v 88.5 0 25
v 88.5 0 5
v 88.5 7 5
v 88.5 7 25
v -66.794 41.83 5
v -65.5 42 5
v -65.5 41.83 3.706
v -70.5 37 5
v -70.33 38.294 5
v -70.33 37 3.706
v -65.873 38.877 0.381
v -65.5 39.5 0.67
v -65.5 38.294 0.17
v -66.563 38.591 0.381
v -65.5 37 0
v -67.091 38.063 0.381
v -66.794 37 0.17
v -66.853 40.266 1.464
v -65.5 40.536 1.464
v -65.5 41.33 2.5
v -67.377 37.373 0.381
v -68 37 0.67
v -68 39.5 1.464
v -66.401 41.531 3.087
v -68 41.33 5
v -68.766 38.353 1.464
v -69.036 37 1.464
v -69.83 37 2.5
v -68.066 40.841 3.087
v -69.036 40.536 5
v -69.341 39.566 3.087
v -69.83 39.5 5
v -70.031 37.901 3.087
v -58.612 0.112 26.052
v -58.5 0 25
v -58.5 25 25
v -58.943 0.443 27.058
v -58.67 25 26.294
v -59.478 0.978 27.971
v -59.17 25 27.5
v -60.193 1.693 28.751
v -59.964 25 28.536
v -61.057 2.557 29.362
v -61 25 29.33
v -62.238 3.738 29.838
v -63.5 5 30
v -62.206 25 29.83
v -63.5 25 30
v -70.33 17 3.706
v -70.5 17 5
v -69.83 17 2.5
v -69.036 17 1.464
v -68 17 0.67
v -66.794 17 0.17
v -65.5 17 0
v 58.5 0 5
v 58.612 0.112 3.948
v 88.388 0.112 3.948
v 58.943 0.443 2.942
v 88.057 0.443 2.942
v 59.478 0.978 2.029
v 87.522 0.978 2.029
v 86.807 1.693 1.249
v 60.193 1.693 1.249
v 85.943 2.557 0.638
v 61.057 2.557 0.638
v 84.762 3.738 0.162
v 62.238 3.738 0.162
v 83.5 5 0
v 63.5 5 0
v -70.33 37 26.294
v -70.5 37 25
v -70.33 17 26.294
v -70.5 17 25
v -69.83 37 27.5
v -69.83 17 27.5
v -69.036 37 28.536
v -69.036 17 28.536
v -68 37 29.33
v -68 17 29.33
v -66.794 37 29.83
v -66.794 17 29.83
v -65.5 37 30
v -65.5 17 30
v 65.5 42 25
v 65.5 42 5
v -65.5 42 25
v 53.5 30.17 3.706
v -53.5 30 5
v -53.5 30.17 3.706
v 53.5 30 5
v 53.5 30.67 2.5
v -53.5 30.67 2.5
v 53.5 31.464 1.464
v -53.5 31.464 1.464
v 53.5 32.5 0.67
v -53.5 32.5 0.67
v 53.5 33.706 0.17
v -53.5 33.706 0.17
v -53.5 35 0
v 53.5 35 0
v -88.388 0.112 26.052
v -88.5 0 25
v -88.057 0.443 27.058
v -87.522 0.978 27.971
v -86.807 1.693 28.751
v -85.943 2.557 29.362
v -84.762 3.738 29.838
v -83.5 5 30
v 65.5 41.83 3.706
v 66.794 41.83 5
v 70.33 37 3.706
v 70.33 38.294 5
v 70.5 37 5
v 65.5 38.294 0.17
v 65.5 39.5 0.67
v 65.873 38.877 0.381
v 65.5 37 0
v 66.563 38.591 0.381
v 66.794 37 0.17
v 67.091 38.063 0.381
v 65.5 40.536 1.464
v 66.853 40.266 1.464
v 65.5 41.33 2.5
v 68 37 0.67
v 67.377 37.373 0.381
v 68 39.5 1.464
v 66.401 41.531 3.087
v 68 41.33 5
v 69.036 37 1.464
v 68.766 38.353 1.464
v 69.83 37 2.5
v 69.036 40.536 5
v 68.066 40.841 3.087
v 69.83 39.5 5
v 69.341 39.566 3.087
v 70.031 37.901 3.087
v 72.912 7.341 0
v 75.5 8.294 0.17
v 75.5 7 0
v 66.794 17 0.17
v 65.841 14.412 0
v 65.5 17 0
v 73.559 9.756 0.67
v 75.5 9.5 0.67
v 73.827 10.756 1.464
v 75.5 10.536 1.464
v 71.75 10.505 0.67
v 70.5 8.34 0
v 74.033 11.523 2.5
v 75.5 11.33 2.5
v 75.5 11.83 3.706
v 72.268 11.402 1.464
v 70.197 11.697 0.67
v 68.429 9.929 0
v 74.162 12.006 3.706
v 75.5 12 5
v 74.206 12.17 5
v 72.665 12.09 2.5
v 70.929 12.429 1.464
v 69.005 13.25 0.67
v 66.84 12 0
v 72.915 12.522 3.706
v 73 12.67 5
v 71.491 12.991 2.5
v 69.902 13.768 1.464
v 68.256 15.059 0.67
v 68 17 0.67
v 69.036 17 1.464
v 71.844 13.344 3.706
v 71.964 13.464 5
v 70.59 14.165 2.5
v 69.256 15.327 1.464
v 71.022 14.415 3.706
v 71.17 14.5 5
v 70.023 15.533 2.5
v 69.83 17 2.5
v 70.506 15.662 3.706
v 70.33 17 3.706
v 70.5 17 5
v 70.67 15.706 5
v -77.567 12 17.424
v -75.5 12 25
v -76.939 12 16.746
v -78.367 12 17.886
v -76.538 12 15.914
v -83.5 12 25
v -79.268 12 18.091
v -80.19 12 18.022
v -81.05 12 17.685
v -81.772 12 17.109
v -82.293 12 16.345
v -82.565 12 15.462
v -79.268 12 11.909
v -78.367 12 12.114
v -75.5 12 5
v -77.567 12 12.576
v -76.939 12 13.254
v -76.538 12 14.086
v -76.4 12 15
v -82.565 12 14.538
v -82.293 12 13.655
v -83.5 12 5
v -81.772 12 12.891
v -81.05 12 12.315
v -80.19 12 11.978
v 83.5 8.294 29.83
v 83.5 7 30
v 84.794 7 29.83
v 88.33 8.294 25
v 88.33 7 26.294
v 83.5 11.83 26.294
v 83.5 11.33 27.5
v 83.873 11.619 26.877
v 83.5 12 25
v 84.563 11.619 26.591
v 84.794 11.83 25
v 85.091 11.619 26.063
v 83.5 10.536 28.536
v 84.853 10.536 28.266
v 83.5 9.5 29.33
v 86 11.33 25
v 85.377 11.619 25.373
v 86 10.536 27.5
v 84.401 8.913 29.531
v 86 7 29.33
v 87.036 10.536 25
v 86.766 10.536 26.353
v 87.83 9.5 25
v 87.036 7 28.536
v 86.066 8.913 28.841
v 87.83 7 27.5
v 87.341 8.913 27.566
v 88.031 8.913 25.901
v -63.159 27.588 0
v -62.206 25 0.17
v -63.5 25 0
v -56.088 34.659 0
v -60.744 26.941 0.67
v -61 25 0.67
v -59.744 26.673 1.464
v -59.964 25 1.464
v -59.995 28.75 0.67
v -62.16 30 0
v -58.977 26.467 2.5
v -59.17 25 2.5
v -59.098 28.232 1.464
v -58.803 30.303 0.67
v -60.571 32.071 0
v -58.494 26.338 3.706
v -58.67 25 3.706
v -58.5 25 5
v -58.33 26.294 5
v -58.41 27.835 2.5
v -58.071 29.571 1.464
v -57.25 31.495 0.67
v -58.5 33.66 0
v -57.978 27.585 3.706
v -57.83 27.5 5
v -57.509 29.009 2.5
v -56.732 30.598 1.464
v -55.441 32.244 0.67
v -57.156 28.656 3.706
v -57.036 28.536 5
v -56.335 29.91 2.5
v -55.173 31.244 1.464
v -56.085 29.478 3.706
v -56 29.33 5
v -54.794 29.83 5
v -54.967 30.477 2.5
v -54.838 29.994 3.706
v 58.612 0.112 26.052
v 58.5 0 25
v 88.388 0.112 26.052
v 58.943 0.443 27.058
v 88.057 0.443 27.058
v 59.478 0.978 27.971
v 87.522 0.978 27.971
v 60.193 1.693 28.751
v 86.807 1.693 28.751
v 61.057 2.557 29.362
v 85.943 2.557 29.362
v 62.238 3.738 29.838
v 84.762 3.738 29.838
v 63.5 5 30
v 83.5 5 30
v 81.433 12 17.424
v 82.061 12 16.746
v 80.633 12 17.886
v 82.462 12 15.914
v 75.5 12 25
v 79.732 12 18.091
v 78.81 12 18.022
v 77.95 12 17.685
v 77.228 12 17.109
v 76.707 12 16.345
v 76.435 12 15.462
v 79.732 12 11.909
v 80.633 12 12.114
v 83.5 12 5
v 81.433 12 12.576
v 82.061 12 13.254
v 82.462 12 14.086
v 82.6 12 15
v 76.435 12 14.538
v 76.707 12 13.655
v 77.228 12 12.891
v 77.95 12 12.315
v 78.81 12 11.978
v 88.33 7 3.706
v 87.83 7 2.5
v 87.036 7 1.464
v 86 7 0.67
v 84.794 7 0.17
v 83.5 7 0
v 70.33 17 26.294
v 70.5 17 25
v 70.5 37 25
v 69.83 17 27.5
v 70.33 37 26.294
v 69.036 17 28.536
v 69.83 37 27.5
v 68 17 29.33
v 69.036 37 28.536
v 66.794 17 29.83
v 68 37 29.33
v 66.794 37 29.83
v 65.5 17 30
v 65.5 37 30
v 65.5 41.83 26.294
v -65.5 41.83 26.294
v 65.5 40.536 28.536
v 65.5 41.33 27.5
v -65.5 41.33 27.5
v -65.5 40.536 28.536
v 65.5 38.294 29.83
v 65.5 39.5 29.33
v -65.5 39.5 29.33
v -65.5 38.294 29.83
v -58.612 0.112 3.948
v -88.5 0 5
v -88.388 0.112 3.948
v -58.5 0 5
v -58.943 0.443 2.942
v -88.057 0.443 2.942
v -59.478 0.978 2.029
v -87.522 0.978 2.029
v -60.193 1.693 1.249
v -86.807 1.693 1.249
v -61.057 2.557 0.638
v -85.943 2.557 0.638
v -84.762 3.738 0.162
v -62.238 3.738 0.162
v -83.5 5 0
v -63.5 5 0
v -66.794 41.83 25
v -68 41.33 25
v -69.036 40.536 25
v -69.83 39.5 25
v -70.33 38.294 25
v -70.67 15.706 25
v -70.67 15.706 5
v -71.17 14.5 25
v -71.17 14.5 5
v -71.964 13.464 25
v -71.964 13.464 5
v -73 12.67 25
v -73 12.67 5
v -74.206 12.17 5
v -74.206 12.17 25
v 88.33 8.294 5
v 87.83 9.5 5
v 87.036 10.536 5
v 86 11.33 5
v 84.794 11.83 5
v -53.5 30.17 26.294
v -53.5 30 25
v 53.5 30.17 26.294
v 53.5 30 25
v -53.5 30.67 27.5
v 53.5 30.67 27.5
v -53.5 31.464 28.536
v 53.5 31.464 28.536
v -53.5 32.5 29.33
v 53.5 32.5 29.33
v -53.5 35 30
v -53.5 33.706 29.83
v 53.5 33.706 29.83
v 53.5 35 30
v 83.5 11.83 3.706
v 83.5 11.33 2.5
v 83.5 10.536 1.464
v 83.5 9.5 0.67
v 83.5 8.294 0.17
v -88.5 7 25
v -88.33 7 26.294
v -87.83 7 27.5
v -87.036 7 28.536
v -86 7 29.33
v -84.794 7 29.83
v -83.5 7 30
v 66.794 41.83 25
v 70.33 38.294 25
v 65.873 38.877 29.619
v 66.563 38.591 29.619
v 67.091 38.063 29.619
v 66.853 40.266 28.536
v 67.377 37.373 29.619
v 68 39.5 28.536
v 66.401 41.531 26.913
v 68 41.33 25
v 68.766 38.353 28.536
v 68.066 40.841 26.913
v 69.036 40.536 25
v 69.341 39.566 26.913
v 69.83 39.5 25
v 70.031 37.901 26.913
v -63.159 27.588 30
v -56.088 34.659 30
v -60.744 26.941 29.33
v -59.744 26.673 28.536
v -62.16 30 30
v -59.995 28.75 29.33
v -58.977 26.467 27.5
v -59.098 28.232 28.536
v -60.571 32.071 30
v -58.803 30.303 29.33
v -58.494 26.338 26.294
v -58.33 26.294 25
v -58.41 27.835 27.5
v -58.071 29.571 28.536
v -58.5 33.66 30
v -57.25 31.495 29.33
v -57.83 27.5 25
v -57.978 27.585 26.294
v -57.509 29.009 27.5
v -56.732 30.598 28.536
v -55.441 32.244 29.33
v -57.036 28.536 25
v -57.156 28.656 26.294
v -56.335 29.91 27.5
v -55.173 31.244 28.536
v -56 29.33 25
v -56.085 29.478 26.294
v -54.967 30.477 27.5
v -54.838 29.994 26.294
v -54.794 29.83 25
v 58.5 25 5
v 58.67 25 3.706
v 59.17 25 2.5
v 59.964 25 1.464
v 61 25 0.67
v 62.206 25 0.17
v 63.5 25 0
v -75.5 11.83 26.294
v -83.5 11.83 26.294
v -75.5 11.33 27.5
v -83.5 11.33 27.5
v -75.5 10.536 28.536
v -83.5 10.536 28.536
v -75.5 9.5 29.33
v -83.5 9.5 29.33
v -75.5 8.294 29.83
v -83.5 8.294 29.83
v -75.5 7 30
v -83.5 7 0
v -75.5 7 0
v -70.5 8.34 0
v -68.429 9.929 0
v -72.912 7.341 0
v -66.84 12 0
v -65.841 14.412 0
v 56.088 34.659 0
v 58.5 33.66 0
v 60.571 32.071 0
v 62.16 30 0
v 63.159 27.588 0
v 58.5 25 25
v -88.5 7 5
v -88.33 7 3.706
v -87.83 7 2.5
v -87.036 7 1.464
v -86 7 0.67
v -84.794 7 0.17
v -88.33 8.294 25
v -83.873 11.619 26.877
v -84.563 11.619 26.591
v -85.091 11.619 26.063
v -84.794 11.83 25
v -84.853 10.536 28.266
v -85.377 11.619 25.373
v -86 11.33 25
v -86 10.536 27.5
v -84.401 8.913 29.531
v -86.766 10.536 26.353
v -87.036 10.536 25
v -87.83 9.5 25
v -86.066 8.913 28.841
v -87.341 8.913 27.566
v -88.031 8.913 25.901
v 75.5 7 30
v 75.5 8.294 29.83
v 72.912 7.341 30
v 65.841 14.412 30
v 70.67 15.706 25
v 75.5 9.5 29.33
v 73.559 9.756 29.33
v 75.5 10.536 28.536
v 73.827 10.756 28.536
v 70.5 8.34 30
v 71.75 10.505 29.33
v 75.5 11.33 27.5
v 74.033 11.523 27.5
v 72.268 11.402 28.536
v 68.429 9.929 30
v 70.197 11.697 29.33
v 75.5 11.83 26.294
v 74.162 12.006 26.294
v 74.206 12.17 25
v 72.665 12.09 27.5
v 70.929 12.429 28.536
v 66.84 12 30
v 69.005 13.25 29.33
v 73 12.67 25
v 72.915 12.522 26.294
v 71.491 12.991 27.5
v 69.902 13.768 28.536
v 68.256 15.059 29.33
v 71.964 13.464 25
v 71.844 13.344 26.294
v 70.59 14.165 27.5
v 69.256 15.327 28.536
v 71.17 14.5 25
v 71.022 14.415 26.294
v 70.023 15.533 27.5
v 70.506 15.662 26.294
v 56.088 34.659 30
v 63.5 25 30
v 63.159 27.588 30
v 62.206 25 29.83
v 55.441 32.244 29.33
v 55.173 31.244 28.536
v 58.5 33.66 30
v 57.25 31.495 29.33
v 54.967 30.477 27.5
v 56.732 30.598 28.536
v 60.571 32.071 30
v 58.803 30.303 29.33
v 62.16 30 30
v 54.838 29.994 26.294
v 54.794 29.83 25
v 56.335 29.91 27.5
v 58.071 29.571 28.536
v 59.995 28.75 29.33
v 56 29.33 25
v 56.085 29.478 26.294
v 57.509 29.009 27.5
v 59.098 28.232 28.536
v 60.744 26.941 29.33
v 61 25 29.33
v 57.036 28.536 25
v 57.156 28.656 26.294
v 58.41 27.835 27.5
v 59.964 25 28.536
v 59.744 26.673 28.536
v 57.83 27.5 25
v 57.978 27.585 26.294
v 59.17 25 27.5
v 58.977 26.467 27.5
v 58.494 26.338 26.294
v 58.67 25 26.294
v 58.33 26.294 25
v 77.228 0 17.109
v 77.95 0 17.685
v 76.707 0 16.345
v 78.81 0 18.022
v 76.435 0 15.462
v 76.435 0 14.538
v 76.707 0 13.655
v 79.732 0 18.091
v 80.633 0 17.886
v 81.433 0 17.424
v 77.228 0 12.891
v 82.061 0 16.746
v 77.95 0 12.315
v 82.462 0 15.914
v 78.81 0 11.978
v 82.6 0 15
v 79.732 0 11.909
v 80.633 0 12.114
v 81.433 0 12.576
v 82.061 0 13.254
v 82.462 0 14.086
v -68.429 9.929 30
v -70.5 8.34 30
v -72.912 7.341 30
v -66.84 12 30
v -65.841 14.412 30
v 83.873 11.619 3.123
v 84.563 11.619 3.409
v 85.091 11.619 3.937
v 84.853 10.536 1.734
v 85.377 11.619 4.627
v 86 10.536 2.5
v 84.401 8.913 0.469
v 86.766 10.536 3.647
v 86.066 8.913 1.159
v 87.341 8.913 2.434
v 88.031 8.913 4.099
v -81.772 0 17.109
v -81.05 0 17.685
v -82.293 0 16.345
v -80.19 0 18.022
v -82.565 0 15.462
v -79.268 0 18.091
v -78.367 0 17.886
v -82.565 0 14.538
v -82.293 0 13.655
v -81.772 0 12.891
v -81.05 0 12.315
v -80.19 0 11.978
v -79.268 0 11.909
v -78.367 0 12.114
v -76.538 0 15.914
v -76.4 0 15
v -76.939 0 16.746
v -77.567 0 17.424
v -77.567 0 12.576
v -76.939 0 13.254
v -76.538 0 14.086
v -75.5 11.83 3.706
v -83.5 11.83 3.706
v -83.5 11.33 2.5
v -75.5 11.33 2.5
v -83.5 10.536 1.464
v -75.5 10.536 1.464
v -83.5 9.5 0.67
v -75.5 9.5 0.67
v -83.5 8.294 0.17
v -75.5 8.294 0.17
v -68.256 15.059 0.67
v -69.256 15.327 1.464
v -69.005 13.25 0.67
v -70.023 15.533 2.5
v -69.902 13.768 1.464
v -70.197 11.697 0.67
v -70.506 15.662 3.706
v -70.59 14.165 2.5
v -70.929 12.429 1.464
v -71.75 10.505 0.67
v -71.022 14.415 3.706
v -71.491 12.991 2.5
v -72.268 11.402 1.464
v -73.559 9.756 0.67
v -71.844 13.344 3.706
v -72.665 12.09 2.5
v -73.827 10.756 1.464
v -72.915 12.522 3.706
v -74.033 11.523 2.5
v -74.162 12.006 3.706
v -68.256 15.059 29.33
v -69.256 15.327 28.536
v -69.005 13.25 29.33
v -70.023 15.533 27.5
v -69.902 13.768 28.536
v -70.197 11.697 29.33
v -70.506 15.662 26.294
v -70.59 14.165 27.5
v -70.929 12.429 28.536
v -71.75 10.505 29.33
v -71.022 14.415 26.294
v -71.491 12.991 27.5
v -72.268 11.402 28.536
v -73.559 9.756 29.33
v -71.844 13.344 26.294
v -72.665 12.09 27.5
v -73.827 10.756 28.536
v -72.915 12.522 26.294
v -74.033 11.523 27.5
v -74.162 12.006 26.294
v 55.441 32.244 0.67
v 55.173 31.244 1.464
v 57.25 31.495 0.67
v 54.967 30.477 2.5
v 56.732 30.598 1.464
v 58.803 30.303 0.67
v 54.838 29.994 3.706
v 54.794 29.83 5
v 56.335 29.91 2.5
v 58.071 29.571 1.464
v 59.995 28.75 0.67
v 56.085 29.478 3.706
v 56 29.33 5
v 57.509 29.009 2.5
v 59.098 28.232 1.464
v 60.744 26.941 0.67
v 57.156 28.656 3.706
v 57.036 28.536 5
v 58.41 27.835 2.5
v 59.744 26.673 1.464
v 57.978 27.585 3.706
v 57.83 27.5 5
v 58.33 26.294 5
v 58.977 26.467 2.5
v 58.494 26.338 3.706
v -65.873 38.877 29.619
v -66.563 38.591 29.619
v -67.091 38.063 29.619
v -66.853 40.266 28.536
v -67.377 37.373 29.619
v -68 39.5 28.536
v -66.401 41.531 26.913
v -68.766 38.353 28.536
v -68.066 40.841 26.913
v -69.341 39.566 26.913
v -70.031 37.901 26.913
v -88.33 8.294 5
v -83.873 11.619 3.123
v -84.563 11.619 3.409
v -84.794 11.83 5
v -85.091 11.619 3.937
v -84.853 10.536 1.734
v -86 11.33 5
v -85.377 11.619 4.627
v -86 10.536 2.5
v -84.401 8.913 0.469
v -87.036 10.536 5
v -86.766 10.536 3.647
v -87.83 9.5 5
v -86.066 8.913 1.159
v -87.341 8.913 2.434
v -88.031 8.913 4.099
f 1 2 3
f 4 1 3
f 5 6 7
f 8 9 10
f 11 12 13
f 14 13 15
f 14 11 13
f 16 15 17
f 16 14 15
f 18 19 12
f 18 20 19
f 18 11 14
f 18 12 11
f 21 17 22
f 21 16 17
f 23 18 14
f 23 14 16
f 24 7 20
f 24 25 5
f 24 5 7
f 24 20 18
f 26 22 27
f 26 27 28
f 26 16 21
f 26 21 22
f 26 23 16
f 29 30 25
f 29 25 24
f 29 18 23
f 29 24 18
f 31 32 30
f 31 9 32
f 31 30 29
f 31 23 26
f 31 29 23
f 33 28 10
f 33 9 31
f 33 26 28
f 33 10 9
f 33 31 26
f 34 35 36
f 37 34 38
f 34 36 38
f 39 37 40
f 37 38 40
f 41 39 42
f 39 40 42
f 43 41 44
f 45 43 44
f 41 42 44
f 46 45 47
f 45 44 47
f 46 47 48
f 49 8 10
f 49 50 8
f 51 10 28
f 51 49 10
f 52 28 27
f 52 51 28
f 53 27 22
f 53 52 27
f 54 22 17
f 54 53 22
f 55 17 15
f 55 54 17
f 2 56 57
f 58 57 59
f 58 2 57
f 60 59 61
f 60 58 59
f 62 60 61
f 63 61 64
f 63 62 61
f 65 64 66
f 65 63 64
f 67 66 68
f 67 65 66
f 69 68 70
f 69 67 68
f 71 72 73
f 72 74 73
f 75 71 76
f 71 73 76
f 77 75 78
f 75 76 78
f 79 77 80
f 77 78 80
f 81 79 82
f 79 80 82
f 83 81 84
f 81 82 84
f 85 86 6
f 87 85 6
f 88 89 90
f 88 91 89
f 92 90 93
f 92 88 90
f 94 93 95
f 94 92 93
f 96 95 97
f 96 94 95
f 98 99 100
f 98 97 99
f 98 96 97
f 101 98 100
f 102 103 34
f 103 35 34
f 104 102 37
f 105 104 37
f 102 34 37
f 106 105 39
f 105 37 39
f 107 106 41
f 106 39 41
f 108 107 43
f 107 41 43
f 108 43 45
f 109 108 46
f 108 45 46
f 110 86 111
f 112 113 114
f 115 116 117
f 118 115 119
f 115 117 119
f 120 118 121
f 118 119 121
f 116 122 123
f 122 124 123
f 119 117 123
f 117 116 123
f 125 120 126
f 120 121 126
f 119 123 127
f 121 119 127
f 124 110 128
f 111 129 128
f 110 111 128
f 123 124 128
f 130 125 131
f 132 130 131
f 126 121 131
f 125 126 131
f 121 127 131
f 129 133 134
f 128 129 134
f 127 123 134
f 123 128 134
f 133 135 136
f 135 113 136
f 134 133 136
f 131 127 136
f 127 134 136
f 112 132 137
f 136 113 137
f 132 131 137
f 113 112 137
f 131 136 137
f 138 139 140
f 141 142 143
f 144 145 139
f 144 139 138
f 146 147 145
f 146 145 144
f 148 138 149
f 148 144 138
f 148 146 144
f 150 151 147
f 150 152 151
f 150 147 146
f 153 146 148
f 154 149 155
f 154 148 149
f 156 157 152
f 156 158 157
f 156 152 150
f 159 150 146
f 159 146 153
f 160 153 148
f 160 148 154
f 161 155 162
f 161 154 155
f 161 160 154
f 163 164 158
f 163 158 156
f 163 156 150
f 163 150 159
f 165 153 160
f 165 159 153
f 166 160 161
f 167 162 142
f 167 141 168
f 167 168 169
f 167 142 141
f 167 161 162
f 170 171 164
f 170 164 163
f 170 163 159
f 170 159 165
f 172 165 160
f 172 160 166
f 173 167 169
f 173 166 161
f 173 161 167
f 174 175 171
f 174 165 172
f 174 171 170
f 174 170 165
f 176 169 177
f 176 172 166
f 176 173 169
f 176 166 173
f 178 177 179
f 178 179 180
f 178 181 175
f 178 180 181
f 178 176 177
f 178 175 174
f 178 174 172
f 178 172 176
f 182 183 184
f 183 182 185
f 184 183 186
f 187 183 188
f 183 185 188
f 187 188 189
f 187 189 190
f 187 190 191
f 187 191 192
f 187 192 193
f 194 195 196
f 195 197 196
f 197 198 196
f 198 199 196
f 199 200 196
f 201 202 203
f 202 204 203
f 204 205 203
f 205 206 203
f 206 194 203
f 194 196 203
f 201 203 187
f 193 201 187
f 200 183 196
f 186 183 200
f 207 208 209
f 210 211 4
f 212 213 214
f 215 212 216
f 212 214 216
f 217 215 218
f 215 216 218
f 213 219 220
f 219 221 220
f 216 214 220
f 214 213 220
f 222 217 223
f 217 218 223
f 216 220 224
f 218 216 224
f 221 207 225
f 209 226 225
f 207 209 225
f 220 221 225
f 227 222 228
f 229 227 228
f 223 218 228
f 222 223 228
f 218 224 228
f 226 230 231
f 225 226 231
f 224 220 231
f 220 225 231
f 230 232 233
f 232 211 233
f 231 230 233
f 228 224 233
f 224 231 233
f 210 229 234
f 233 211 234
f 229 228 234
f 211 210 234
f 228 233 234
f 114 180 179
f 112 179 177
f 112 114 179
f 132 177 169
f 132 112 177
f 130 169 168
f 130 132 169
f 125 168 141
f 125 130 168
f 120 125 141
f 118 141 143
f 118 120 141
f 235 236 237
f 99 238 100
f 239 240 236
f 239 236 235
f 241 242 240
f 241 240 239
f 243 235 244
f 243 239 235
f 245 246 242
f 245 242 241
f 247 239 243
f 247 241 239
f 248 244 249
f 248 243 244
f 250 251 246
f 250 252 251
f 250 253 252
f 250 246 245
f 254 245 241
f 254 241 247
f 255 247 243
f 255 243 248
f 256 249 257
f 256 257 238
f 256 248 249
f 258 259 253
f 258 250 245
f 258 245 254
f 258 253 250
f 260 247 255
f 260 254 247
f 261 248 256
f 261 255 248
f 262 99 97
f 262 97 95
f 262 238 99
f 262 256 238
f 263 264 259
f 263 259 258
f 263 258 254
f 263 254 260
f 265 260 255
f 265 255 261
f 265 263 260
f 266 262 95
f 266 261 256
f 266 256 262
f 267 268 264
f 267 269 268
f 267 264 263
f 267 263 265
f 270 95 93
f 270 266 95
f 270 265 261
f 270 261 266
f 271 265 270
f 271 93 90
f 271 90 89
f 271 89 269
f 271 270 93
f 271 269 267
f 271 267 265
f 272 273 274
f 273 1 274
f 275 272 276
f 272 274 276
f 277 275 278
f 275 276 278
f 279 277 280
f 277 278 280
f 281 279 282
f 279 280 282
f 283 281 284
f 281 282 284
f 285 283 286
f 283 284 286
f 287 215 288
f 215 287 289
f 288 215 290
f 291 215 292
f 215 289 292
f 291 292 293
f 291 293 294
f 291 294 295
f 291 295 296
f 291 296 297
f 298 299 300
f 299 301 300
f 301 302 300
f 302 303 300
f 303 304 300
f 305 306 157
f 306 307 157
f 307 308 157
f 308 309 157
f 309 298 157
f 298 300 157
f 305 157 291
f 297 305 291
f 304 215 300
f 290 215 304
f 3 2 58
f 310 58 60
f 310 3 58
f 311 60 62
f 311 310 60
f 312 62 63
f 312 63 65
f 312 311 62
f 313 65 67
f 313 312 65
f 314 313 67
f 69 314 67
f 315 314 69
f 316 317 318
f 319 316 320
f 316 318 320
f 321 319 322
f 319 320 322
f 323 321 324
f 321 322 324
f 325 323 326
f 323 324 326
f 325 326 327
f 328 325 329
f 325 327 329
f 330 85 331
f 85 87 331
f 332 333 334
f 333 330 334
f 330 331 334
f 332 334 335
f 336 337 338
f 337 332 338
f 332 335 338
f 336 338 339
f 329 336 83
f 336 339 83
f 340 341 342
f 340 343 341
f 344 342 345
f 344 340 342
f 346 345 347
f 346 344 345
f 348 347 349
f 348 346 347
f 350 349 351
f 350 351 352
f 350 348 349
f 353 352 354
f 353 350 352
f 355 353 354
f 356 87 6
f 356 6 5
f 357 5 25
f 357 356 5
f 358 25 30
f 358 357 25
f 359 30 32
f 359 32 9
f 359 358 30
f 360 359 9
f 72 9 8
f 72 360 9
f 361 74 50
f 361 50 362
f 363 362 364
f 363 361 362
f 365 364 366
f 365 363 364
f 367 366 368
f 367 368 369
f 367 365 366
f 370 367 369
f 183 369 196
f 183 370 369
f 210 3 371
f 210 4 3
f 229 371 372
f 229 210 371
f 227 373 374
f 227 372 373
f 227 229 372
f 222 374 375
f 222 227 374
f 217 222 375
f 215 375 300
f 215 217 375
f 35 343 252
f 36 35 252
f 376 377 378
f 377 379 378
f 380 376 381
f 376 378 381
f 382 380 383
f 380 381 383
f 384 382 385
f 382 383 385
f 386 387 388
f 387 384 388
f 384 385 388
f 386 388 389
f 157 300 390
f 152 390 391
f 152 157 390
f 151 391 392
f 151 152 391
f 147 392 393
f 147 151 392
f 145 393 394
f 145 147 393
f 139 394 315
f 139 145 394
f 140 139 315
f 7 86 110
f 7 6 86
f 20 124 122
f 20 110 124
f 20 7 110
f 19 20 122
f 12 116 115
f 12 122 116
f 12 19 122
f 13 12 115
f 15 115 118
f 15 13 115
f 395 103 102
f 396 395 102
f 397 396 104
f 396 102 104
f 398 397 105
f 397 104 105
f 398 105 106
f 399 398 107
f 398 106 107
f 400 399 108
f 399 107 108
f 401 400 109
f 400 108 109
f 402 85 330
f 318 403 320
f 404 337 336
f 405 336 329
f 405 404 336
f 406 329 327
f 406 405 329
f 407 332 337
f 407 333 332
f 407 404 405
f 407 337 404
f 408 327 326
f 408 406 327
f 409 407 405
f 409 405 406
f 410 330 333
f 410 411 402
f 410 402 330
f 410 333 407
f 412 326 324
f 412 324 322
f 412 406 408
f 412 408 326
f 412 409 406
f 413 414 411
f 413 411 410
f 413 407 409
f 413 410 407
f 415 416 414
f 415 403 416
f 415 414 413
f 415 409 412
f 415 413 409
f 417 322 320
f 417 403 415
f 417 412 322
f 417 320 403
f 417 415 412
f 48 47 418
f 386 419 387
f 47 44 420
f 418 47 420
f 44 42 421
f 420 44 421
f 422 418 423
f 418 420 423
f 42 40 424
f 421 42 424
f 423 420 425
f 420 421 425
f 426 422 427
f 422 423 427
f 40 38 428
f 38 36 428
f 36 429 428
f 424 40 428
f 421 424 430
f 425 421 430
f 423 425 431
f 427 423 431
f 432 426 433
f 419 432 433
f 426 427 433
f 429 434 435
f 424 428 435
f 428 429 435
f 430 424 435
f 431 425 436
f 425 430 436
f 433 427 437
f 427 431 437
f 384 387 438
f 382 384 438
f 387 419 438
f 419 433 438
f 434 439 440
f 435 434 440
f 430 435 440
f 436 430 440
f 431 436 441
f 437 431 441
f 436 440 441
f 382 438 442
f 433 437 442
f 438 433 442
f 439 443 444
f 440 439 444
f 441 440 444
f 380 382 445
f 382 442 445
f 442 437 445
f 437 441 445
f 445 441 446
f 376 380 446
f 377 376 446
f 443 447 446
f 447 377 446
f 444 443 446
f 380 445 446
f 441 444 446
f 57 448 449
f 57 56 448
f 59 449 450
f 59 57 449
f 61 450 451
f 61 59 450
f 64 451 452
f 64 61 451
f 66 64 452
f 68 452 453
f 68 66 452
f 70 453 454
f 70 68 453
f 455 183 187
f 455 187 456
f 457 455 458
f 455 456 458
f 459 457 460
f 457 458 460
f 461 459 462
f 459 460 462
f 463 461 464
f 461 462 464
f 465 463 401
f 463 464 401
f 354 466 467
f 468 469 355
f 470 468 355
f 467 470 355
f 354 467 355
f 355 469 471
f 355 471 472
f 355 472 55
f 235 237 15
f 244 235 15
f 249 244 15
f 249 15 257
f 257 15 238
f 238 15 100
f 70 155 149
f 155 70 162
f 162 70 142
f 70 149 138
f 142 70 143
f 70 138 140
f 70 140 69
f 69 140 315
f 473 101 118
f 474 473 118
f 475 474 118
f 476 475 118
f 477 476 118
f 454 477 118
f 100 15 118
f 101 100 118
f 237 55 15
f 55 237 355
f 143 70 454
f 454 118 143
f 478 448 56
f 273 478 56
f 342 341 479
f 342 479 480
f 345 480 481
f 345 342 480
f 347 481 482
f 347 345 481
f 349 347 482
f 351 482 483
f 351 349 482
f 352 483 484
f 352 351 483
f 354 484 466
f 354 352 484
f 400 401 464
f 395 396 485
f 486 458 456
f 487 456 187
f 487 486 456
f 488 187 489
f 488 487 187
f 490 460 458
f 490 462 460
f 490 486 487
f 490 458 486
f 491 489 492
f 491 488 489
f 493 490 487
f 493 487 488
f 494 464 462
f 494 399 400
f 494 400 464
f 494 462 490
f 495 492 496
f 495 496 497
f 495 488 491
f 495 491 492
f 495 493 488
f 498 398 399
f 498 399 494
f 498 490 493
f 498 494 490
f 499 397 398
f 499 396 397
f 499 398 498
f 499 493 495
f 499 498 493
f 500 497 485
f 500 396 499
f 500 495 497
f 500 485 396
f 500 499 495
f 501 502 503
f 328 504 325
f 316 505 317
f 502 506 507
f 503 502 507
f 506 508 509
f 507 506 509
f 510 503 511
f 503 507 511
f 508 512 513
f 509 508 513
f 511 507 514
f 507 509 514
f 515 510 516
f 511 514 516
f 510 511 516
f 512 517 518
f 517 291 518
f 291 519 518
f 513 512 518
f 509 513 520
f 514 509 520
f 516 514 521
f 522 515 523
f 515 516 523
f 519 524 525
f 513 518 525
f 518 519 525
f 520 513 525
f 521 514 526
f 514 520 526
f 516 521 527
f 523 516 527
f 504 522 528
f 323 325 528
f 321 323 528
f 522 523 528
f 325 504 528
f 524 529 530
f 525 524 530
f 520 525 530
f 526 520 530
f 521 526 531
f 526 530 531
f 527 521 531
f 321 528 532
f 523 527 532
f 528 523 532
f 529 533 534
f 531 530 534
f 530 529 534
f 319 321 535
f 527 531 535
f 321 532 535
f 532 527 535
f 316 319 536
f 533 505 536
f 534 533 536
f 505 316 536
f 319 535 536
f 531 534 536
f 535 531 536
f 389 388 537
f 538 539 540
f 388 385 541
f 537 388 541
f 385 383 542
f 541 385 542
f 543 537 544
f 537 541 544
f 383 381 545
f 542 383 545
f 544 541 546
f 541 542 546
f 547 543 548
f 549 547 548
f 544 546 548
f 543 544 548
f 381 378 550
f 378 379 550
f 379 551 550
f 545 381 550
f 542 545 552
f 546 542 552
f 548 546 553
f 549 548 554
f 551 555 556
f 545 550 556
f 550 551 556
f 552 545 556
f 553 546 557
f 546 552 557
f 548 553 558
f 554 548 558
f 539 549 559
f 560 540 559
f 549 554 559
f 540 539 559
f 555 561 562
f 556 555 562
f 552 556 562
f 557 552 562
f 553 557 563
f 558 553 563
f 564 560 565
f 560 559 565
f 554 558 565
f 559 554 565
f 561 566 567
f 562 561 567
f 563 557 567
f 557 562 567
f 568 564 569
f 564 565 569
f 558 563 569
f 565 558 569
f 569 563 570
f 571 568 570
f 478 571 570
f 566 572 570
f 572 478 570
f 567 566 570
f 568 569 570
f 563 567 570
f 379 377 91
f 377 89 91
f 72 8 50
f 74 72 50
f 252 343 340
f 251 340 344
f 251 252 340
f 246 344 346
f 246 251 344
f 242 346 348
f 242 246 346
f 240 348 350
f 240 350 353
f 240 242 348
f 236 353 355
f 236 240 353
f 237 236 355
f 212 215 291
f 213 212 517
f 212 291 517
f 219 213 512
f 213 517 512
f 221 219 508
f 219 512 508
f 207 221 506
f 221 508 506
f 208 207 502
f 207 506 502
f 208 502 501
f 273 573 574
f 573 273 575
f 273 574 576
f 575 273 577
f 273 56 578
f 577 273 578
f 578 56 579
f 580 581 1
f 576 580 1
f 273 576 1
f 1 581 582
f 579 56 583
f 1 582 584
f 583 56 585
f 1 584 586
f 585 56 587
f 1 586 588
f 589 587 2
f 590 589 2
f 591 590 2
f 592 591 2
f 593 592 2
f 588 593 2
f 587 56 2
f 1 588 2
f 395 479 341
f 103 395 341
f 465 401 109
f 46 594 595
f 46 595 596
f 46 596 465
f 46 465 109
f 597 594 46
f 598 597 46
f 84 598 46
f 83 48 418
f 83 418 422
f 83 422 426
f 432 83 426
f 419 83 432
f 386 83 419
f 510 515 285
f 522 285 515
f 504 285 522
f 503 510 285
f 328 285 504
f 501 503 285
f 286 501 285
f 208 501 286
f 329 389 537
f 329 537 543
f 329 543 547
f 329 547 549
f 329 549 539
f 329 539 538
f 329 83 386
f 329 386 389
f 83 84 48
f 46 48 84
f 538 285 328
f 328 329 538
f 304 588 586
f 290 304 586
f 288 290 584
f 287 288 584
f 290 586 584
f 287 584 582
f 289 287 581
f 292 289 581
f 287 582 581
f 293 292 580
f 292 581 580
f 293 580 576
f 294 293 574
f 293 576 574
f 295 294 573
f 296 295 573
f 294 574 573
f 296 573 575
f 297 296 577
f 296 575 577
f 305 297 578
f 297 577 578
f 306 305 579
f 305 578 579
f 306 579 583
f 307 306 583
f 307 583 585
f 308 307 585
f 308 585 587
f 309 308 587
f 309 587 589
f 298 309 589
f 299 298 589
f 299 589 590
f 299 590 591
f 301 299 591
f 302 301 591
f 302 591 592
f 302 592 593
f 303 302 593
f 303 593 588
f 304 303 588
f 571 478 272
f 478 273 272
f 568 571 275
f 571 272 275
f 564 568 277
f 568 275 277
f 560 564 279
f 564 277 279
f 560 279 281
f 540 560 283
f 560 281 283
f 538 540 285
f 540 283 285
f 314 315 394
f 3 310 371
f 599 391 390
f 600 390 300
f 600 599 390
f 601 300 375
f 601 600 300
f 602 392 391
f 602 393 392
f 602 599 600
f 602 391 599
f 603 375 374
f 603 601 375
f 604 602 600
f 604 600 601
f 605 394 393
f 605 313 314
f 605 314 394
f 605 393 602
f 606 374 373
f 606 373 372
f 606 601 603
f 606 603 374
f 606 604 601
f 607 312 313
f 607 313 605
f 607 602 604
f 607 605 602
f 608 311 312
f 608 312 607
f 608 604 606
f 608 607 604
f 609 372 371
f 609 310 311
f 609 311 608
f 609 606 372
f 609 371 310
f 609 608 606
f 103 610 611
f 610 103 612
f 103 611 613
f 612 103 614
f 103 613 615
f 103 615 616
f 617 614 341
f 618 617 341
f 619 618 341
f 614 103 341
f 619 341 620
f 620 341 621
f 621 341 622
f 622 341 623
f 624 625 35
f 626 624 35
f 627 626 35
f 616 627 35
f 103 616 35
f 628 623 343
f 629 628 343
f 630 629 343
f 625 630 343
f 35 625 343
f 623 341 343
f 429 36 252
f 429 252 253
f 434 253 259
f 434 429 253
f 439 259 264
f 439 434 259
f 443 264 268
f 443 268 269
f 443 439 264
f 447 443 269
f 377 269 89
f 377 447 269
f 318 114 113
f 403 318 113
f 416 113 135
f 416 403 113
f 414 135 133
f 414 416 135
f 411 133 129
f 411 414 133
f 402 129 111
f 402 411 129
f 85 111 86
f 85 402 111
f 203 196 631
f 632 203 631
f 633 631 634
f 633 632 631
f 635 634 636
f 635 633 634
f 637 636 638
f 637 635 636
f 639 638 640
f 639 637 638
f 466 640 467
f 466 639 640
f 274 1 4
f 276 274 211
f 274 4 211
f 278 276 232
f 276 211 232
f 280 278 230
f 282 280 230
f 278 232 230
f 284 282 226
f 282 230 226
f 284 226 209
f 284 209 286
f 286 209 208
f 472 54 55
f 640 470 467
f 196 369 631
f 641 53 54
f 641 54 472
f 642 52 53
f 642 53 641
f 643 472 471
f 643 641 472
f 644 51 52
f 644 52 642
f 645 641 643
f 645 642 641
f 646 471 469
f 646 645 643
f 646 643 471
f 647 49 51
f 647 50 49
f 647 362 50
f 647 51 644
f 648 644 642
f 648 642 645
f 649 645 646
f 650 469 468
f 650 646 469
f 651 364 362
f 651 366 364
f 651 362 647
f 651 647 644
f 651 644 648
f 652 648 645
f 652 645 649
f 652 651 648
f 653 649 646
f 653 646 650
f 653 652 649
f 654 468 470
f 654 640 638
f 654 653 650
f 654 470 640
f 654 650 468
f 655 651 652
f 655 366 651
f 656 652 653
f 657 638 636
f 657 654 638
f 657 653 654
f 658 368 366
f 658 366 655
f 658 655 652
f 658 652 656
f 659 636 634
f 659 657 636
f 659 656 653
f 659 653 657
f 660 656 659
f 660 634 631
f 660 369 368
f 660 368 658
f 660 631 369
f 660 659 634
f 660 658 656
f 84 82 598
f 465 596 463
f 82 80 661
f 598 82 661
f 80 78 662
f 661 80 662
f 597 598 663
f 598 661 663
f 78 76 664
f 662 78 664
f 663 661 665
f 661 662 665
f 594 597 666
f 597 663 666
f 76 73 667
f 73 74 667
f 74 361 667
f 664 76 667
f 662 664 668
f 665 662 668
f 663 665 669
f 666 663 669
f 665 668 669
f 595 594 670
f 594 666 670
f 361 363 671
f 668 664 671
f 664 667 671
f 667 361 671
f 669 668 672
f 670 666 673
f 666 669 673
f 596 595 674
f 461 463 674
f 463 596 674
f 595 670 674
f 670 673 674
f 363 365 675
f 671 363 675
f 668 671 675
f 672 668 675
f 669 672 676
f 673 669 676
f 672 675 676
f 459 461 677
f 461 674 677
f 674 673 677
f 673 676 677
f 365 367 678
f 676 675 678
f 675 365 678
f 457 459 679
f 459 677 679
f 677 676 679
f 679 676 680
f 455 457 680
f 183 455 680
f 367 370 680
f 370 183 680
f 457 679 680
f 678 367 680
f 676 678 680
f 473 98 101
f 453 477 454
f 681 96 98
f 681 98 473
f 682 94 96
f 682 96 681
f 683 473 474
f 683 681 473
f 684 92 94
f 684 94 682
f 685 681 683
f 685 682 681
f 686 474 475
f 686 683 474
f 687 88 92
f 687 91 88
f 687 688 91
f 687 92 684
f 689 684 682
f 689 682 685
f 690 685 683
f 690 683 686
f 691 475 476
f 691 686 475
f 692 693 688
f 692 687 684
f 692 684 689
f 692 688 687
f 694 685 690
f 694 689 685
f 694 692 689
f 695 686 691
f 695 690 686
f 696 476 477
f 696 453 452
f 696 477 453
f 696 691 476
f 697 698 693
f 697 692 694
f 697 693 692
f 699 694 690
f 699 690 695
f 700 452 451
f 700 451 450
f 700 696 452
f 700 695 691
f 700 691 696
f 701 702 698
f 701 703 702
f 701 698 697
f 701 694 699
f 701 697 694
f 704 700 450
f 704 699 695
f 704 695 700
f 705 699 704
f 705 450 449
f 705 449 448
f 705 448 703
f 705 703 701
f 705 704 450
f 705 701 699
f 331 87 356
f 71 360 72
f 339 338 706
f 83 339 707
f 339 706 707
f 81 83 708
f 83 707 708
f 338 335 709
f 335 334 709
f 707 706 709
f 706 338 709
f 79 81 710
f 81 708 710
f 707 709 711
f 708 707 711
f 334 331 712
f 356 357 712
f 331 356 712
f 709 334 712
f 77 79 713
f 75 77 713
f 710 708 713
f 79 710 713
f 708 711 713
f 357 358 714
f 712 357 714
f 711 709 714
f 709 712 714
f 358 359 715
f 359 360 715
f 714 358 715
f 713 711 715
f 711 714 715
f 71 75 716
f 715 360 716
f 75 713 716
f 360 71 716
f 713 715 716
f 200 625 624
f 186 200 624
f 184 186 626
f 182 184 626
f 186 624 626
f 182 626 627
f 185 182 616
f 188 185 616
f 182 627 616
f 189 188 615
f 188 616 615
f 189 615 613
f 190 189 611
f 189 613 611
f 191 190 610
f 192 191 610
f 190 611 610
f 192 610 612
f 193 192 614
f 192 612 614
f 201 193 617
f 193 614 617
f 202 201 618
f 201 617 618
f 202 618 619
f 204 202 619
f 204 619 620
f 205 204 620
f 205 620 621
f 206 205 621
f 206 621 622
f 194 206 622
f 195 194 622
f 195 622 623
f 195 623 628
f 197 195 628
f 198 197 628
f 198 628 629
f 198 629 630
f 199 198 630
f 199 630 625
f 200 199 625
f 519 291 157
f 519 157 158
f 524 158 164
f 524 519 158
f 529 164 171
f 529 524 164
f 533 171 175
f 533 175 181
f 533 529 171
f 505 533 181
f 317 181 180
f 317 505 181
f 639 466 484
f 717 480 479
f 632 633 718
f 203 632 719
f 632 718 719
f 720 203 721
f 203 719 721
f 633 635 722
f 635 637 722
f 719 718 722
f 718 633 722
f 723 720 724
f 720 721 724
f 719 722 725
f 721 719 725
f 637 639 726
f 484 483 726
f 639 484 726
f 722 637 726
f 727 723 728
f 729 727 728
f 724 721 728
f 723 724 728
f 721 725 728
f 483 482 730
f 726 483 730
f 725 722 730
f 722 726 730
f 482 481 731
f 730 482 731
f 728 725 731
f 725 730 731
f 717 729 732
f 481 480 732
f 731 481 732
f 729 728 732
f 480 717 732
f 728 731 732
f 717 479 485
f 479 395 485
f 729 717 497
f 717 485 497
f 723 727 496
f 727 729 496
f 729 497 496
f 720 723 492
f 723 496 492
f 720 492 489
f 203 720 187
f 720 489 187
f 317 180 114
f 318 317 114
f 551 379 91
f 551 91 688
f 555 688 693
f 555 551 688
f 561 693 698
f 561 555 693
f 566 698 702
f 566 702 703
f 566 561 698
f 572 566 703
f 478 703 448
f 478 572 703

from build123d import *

# Parameters (mm, degrees)
F1_DEPTH = 30
F2_R     = 5
F3_R     = 3.1
F4_DEPTH = 25


with BuildPart() as f1:
    # F0 (on Top) → F1 (new body)
    with BuildSketch(Plane.XY):
        Polygon((-88.5, 12), (-88.5, 0), (-58.5, 0), (-58.5, 30), (58.5, 30), (58.5, 0), (88.5, 0), (88.5, 12), (70.5, 12), (70.5, 42), (-70.5, 42), (-70.5, 12), align=None)
    extrude(amount=F1_DEPTH)

    # F2
    f2_edges = [f1.edges().sort_by_distance(p)[0] for p in [
        (70.5, 42, 15),
        (-70.5, 42, 15),
        (0, 42, 0),
        (0, 42, 30),
        (-88.5, 6, 30),
        (-73.5, 0, 30),
        (-58.5, 15, 30),
        (0, 30, 30),
        (58.5, 15, 30),
        (73.5, 0, 30),
        (88.5, 6, 30),
        (79.5, 12, 30),
        (70.5, 27, 30),
        (-70.5, 27, 30),
        (-79.5, 12, 30),
        (-88.5, 6, 0),
        (-73.5, 0, 0),
        (-58.5, 15, 0),
        (0, 30, 0),
        (58.5, 15, 0),
        (73.5, 0, 0),
        (88.5, 6, 0),
        (79.5, 12, 0),
        (70.5, 27, 0),
        (-70.5, 27, 0),
        (-79.5, 12, 0),
        (70.5, 12, 15),
        (-70.5, 12, 15),
        (-58.5, 30, 15),
        (58.5, 30, 15),
        (-88.5, 12, 15),
        (88.5, 12, 15),
    ]]
    fillet(f2_edges, radius=F2_R)

    # F3 (on face) → F4 (cut)
    with BuildSketch(Plane.XZ):
        with Locations((79.5, 15)):
            Circle(F3_R)
        with Locations((-79.5, 15)):
            Circle(F3_R)
    extrude(amount=-F4_DEPTH, mode=Mode.SUBTRACT)


solid = f1.part
